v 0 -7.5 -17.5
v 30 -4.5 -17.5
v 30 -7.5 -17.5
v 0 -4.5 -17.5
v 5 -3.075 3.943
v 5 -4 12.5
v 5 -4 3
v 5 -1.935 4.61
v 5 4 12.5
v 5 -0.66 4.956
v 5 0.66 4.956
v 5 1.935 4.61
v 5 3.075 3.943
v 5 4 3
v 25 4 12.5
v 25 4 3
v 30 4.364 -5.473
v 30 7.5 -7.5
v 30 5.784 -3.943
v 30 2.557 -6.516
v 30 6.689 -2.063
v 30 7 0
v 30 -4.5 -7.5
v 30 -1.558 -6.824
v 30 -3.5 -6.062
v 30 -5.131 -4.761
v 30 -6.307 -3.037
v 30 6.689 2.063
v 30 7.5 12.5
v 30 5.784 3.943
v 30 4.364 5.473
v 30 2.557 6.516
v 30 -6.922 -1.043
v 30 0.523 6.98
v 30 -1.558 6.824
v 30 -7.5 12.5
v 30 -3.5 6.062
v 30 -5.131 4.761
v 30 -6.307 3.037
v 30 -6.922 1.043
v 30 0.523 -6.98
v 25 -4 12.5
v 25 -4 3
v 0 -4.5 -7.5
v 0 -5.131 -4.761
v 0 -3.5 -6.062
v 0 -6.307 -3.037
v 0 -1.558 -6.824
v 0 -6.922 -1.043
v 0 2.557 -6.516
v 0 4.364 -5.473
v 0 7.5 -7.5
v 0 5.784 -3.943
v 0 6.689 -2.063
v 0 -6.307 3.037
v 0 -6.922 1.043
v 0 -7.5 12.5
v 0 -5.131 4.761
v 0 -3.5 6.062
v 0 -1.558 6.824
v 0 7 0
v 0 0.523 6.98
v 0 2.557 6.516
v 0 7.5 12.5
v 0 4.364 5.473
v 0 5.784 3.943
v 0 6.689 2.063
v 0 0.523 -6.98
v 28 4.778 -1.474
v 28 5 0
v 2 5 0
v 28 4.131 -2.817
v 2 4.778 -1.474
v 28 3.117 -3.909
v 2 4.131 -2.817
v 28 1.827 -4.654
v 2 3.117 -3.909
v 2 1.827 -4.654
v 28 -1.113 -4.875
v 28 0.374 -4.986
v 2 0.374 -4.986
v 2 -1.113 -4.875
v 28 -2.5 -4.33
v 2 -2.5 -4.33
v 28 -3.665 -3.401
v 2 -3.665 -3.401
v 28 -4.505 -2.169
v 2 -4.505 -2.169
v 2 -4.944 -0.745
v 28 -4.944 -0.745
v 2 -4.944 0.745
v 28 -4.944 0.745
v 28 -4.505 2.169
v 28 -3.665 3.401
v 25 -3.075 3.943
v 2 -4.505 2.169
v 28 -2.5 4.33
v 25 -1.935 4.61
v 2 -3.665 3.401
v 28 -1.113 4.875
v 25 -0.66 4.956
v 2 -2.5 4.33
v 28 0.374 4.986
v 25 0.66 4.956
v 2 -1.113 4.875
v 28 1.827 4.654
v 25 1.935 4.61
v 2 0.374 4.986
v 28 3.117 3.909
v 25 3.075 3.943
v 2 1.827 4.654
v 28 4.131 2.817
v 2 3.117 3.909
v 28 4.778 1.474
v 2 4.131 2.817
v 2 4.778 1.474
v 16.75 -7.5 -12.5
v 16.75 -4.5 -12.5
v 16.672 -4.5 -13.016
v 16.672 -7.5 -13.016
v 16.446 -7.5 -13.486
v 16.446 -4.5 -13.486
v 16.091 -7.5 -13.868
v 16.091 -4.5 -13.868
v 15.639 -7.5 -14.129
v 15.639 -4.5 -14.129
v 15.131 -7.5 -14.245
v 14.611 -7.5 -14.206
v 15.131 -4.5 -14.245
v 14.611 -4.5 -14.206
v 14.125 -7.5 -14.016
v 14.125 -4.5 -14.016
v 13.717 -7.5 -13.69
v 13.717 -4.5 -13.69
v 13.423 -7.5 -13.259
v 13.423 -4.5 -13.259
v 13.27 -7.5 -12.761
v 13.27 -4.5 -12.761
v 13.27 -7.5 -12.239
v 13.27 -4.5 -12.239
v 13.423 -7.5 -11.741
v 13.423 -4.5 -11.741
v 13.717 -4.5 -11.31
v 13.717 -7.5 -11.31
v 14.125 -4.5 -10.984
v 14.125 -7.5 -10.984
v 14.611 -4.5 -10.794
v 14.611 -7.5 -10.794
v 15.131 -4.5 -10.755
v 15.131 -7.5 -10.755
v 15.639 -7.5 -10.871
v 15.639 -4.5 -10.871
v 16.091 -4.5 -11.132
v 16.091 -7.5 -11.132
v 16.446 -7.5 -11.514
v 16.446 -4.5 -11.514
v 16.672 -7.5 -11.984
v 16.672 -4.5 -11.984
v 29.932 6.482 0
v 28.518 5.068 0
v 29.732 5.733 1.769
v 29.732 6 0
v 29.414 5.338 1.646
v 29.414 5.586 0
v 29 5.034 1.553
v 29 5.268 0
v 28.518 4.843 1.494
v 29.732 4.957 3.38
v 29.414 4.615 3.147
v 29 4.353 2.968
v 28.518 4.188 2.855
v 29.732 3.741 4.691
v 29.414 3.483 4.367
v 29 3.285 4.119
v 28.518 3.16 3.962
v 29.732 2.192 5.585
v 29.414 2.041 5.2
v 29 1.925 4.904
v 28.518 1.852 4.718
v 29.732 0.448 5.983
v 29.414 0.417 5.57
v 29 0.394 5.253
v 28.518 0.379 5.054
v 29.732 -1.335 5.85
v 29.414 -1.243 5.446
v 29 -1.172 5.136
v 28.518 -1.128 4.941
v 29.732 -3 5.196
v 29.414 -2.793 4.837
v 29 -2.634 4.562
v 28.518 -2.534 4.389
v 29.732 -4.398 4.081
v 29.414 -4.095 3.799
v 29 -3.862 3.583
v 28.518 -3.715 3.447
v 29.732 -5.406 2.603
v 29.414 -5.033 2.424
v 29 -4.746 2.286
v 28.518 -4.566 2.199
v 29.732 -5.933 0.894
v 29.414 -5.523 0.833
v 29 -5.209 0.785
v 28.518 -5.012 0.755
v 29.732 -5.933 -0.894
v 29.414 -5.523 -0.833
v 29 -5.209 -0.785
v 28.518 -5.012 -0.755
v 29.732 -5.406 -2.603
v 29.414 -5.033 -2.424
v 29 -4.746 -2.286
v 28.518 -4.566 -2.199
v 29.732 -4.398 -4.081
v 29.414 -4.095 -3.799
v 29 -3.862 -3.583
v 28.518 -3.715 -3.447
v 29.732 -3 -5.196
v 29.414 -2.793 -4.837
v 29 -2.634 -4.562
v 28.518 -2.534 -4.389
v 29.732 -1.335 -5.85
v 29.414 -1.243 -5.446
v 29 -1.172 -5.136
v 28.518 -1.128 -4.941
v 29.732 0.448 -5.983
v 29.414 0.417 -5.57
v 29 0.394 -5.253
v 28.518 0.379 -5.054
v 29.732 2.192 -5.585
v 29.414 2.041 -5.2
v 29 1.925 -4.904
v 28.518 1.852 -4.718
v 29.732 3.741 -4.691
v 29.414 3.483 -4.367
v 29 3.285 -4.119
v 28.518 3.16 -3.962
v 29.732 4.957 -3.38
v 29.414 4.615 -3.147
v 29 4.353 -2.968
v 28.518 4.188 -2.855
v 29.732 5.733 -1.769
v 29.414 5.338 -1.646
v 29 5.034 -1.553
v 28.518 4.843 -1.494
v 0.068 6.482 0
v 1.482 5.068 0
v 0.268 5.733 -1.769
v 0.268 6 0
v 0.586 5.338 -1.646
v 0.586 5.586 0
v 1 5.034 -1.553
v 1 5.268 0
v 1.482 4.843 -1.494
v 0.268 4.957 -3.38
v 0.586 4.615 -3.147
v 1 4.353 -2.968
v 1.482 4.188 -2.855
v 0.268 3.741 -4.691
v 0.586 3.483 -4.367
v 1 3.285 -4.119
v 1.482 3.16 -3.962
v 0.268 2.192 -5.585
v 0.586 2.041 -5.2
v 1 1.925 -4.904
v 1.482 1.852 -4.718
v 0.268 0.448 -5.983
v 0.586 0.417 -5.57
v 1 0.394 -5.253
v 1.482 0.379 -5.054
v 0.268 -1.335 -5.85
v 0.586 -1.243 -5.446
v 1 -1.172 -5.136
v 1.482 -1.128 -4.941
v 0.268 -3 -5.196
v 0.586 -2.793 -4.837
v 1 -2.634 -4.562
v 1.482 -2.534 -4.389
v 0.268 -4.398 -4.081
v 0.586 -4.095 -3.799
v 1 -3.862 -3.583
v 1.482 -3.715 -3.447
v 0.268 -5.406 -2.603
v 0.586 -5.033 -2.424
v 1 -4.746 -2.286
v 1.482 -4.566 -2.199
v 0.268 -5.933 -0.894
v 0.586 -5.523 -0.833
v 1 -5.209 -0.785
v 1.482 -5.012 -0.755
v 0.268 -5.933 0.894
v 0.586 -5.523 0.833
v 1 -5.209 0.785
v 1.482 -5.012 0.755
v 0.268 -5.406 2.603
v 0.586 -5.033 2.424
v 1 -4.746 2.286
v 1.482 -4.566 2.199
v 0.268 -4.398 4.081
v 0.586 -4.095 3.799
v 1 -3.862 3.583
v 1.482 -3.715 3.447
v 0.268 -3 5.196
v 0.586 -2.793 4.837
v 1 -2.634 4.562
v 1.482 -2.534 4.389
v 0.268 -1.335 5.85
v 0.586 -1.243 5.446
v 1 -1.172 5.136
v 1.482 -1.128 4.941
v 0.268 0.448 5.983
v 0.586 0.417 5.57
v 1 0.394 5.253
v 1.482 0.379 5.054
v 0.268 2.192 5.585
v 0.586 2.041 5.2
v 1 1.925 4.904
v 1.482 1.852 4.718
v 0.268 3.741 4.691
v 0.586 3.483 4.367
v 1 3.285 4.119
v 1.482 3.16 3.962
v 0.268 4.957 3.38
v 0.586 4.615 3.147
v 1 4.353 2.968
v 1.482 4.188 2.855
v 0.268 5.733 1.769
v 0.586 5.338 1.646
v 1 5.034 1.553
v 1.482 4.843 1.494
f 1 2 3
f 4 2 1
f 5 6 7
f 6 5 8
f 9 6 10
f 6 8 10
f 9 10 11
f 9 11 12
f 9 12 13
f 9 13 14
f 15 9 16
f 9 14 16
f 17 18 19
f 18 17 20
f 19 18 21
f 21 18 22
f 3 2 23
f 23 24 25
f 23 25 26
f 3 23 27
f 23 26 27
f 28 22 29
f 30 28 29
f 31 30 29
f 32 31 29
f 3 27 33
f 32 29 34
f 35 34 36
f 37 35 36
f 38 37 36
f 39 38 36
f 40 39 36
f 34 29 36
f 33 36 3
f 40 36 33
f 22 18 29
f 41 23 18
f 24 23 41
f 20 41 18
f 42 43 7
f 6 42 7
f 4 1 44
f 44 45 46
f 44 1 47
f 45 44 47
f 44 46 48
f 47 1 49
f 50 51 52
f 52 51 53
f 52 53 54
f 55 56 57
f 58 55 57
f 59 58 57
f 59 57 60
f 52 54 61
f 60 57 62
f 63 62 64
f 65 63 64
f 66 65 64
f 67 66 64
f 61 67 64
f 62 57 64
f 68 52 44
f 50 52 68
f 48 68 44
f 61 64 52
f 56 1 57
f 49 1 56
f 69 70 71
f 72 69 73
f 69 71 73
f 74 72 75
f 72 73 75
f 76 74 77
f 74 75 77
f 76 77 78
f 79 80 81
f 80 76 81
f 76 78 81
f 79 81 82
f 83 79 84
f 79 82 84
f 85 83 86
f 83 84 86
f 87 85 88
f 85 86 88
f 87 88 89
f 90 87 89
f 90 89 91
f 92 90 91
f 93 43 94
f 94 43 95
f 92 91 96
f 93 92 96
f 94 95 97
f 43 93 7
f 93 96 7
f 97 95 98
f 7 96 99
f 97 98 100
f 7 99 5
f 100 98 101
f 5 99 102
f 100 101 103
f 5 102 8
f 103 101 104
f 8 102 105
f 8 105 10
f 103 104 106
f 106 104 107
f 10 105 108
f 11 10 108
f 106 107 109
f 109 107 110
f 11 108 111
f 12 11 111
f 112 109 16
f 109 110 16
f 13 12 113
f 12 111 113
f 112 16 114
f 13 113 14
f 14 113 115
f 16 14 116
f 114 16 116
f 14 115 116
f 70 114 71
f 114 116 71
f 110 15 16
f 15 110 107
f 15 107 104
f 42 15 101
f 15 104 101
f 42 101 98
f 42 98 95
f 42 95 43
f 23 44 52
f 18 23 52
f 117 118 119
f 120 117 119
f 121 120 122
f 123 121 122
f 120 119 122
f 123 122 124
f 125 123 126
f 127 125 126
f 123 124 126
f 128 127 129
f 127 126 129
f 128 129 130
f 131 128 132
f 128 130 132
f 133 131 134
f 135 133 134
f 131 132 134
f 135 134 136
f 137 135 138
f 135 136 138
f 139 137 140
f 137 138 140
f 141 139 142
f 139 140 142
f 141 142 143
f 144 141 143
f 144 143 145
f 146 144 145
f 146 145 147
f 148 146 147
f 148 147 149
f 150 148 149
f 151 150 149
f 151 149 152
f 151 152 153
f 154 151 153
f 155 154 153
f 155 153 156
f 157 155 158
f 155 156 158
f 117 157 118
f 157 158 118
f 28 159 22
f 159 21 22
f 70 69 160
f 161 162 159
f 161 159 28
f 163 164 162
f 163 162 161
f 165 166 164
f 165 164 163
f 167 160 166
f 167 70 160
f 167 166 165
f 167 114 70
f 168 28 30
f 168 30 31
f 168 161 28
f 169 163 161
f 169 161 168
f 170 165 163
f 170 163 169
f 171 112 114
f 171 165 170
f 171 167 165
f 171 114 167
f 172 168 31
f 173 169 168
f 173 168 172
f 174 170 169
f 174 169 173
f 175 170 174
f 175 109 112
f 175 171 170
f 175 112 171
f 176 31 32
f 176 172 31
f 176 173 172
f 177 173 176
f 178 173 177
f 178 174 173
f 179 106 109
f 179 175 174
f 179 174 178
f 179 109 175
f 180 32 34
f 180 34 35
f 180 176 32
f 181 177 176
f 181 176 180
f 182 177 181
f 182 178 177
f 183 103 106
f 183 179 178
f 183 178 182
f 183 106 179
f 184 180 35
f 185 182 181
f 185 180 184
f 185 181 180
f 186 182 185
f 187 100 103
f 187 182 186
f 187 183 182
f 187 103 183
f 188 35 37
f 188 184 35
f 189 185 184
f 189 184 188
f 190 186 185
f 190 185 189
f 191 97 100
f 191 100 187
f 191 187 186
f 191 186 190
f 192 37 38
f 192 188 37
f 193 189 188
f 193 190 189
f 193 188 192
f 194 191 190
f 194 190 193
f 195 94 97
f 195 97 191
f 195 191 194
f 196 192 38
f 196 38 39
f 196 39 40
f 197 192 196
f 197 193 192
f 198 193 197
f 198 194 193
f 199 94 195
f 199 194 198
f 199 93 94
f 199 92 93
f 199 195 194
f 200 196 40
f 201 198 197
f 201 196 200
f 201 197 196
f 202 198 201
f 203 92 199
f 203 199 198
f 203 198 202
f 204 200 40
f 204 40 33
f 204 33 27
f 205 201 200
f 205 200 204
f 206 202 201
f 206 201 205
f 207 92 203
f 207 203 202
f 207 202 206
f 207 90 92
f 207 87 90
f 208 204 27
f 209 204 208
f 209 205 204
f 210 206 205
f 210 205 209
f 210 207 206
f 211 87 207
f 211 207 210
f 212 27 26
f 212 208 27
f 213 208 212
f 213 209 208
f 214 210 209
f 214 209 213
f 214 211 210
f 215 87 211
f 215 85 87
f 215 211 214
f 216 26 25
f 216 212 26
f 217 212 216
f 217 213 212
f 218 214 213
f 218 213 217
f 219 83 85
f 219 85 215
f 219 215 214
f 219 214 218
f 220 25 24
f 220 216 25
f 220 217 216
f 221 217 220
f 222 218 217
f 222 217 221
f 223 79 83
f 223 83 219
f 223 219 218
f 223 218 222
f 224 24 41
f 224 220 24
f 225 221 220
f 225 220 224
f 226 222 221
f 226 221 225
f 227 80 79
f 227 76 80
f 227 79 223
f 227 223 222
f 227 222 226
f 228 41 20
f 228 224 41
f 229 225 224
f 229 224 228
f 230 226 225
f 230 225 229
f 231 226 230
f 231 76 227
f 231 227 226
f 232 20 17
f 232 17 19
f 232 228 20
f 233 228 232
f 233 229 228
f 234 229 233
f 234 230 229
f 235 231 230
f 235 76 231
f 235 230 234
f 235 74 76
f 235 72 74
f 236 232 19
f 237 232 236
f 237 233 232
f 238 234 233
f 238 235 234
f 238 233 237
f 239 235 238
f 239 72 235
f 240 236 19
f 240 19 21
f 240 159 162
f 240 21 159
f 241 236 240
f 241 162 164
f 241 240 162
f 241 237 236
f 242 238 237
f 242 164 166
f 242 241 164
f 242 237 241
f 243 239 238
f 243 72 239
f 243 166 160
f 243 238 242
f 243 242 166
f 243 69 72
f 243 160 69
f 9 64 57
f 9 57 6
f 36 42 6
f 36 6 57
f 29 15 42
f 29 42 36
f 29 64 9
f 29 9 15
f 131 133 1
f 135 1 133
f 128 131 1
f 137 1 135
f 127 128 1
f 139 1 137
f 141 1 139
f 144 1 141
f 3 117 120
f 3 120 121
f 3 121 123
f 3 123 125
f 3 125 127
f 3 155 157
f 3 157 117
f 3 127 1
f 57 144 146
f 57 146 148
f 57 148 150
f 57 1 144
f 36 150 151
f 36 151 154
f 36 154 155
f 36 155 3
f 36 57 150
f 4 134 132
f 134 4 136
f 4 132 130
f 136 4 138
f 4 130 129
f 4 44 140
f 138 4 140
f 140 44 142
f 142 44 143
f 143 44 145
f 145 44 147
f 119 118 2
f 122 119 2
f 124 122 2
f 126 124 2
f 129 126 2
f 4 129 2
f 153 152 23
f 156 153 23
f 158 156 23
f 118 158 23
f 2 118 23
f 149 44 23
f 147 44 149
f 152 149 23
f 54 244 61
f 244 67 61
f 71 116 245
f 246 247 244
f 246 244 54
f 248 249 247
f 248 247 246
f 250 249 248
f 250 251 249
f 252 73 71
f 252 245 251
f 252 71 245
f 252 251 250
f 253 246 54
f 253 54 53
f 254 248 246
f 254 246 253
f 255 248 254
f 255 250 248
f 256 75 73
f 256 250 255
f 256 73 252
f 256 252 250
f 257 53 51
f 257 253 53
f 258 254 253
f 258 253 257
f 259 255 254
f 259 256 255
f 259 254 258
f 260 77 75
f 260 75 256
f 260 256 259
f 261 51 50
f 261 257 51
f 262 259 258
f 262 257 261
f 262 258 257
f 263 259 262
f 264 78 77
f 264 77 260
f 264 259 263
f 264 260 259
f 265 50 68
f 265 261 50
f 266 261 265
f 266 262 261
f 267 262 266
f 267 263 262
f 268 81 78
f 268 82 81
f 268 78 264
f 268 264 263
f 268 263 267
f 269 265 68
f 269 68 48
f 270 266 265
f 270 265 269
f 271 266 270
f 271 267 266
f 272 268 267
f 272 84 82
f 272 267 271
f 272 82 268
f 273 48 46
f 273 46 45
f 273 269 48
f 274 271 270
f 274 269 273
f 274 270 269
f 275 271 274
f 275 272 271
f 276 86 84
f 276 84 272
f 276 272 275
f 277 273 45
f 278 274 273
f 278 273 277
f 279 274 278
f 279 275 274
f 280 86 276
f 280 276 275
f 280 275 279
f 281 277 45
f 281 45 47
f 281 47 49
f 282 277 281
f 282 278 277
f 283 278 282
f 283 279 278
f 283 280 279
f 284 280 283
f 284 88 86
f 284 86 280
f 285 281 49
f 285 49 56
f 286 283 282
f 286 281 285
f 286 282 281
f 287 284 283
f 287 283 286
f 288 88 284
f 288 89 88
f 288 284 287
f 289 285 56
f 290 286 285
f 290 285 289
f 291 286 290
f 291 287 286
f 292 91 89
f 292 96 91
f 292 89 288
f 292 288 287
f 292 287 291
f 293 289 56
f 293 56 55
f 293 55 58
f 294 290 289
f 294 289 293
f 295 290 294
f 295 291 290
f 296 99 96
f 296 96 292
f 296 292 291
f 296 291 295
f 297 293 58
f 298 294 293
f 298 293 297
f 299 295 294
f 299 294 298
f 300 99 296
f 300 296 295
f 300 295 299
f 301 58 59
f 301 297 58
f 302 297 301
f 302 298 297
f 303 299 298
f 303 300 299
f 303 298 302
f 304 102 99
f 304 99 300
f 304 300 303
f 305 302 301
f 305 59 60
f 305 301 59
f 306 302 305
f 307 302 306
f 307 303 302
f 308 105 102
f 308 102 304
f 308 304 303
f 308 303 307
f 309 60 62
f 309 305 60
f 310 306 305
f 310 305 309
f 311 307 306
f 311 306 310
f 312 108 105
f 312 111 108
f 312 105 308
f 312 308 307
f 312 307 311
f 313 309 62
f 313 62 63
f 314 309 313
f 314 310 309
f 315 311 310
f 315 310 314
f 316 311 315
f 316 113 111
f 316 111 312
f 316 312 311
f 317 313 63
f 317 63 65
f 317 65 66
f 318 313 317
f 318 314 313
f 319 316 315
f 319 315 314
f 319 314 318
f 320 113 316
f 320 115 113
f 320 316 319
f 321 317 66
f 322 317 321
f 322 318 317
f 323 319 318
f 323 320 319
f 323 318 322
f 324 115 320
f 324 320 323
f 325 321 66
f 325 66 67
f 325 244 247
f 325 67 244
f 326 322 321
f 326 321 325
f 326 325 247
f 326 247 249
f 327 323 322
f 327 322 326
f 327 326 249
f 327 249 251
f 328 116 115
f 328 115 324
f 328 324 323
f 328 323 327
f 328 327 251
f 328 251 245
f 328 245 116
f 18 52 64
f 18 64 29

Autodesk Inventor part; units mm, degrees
ref_plane "YZ Plane" through (0, 0, 0) normal (1, 0, 0) x (0, 1, 0)
ref_plane "XZ Plane" through (0, 0, 0) normal (0, 1, 0) x (-1, 0, 0)
ref_plane "XY Plane" through (0, 0, 0) normal (0, 0, 1) x (1, 0, 0)
sketch "Esquisse1" plane through (0, 0, 0) normal (1, 0, 0) x (0, 1, 0)
  circle A0 centre (0, 0) radius 5
  line L0 (7.5, 7.5) -> (-7.5, 7.5)
  line L1 (-7.5, 7.5) -> (-7.5, -7.5)
  line L2 (-7.5, -7.5) -> (7.5, -7.5)
  line L3 (7.5, -7.5) -> (7.5, 7.5)
  line L4 (7.5, 7.5) -> (-7.5, -7.5)
  line L5 (-7.5, 7.5) -> (7.5, -7.5)
  point P0 (0, 0)
  dimension "d0" = 10
  dimension "d1" = 15
  dimension "d2" = 15
extrude "Extrusion1" add sketch "Esquisse1" along normal blind 30 contours A0 L4 L3 L5 | A0 L5 L0 L4 | L5 L2 L4 A0 | A0 L4 L1 L5
sketch "Esquisse6" plane through (0, -7.5, 7.5) normal (0, 0, 1) x (1, 0, 0)
  line L0 (0, 7.5) -> (30, 7.5)
  line L1 (30, 15) -> (30, 0) projected
  line L2 (5, 11.5) -> (25, 11.5)
  line L3 (25, 11.5) -> (25, 7.5)
  line L4 (25, 7.5) -> (5, 7.5)
  line L5 (5, 7.5) -> (5, 11.5)
  line L6 (0, 15) -> (0, 0) projected
  line L7 (0, 11.5) -> (5, 11.5)
  line L8 (5, 3.5) -> (25, 3.5)
  line L9 (25, 3.5) -> (25, 7.5)
  line L10 (5, 7.5) -> (5, 3.5)
  dimension "d14" = 4
  dimension "d15" = 5
  dimension "d16" = 20
extrude "Extrusion5" cut sketch "Esquisse6" against normal blind 5 contours L5 L2 L3 L0 | L0 L9 L8 L10
sketch "Esquisse8" plane through (0, -7.5, 7.5) normal (0, 0, 1) x (1, 0, 0)
  line L0 (5, 11.5) -> (25, 11.5) projected
  line L1 (25, 3.5) -> (5, 3.5) projected
  line L2 (5, 11.5) -> (25, 11.5)
  line L3 (25, 11.5) -> (25, 3.5)
  line L4 (25, 3.5) -> (5, 3.5)
  line L5 (5, 3.5) -> (5, 11.5)
  line L6 (0, 15) -> (30, 15) projected
  line L7 (30, 15) -> (30, 0) projected
  line L8 (0, 15) -> (30, 15)
  line L9 (30, 15) -> (30, 0)
  line L10 (30, 0) -> (0, 0)
  line L11 (0, 0) -> (0, 15)
  point P0 (0, 7.5)
extrude "Extrusion6" add sketch "Esquisse8" along normal blind 5
sketch "Esquisse9" plane through (0, -7.5, -7.5) normal (0, 0, -1) x (-1, 0, 0)
  line L0 (0, 0) -> (-30, 0) projected
  line L1 (-30, 0) -> (0, 0)
  line L2 (0, 0) -> (0, 3)
  line L3 (0, 3) -> (-30, 3)
  line L4 (-30, 3) -> (-30, 0)
  point P0 (0, 7.5)
extrude "Extrusion7" add sketch "Esquisse9" along normal blind 10
sketch "Esquisse10" plane through (0, -4.5, -7.5) normal (0, 1, 0) x (1, 0, 0)
  circle A0 centre (15, 5) radius 1.75
  line L0 (0, 10) -> (30, 10) projected
  line L1 (30, 0) -> (30, 10) projected
  point P0 (0, -7.5)
  dimension "d23" = 3.5
  dimension "d24" = 5
  dimension "d25" = 15
extrude "Extrusion8" cut sketch "Esquisse10" against normal blind 10
fillet "Congé2" radius 2 2 edges at (0, -5, 0) (30, -5, 0)
properties part number "Pièce1_Impression 3D"
